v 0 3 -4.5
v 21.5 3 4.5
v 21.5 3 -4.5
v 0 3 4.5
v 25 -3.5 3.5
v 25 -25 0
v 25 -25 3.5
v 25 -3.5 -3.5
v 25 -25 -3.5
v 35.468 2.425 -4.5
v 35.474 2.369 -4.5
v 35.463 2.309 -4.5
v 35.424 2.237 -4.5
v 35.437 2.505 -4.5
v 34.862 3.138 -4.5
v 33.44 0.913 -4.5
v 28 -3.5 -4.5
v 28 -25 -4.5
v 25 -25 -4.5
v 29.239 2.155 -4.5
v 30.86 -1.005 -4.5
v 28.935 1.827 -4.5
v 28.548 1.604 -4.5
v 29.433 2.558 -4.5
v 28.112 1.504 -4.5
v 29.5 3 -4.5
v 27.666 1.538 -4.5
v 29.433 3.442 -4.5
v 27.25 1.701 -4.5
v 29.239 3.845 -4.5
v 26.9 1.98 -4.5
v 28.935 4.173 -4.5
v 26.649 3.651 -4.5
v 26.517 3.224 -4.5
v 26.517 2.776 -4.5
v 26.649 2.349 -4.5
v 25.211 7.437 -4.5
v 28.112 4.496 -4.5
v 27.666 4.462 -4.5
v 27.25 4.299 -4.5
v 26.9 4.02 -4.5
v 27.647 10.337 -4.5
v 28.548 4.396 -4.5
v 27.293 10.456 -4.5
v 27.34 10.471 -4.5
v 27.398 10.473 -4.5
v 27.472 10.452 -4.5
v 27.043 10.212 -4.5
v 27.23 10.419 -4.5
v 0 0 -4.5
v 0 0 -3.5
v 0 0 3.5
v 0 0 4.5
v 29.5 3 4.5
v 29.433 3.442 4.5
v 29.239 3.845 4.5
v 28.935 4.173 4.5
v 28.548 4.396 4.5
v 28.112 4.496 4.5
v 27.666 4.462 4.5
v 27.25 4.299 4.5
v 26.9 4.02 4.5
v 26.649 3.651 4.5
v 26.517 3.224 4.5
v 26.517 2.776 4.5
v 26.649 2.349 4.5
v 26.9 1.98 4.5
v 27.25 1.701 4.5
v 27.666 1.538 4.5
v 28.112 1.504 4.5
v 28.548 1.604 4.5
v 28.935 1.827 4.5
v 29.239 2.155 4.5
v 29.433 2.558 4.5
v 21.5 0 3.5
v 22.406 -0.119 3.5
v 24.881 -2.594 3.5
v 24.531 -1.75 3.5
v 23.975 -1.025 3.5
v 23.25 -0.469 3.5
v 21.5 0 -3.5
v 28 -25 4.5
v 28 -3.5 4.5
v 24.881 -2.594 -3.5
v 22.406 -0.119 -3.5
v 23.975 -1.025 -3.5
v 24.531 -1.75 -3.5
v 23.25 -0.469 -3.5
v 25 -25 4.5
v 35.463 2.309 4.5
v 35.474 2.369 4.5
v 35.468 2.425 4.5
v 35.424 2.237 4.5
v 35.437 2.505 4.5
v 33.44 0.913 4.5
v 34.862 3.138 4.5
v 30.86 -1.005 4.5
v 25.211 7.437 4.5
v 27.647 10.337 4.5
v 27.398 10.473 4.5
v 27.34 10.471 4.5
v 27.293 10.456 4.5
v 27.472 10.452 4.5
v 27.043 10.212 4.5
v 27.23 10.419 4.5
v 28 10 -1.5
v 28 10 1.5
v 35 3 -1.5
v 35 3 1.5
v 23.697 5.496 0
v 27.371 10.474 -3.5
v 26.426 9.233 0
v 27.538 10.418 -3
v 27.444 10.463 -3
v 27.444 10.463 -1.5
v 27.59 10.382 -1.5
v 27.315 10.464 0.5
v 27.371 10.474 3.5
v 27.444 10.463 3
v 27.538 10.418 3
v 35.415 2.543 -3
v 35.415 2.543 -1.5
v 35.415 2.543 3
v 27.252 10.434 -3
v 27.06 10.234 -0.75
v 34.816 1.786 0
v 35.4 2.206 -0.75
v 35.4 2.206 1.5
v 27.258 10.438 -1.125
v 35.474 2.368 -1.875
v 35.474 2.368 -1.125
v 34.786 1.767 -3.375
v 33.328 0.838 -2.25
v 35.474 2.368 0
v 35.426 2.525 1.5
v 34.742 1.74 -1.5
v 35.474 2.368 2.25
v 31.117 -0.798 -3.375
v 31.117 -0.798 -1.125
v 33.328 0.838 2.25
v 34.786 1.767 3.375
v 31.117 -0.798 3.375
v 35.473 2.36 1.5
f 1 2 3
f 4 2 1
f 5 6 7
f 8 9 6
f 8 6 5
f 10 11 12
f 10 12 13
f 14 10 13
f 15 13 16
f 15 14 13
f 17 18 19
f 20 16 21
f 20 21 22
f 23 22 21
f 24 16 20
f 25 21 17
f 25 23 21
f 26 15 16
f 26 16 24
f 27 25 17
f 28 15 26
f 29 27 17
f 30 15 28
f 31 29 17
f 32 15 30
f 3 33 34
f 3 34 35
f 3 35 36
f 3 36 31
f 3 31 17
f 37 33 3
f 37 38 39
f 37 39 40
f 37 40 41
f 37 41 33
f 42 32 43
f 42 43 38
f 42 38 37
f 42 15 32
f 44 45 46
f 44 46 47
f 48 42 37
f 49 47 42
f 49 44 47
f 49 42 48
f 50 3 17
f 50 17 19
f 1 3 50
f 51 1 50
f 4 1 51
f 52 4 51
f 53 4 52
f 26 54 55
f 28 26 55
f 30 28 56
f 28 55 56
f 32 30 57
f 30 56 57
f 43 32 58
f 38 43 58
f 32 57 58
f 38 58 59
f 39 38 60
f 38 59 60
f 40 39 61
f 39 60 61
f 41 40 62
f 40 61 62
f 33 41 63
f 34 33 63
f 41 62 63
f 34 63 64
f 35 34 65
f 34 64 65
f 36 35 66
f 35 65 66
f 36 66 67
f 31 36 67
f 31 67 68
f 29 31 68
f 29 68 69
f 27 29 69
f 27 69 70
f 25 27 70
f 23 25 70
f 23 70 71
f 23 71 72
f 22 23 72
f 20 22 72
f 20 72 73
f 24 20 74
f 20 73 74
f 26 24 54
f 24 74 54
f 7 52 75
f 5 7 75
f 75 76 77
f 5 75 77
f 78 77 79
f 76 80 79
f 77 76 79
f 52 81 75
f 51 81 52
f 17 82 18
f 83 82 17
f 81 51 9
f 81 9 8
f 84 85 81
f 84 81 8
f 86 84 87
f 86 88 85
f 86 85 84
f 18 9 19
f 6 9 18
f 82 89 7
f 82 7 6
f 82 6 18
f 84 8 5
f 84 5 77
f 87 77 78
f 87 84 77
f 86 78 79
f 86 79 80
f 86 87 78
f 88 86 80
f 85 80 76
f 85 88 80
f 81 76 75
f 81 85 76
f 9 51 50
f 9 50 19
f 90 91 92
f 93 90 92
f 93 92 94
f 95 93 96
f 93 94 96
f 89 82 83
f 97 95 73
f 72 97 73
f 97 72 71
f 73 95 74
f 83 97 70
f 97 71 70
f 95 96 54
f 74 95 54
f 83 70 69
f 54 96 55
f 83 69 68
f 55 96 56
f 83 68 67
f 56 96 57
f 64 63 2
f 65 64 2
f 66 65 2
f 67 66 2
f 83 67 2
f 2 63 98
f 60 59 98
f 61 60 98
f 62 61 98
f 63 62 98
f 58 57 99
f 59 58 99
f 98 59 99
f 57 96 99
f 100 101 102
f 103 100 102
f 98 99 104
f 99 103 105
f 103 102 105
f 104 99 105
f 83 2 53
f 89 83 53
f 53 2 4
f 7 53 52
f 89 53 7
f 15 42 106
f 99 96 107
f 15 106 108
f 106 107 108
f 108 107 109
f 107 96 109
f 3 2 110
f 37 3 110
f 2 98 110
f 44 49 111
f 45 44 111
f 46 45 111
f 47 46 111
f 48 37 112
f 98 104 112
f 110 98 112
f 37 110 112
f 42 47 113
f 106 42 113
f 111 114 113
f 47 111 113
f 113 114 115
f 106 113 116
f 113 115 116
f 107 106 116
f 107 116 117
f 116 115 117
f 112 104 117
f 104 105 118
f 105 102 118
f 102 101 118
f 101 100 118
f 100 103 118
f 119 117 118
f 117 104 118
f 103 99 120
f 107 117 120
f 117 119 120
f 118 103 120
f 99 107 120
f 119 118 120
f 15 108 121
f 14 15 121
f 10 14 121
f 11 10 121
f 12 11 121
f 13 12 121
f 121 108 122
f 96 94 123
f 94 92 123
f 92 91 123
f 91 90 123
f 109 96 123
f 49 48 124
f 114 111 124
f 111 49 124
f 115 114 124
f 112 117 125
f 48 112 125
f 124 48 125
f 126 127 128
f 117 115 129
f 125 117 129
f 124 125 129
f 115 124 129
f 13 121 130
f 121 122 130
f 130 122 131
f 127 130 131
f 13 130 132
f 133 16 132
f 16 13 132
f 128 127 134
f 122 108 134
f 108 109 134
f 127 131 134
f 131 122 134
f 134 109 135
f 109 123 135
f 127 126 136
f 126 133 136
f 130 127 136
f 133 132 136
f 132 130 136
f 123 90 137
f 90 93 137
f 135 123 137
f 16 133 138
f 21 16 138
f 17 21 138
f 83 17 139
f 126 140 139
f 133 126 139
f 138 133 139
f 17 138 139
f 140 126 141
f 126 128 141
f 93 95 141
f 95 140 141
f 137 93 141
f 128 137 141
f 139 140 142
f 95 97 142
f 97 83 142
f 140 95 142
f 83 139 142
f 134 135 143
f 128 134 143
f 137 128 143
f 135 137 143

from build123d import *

# Parameters (mm, degrees)
F2_DEPTH      = 4.5
F2_DEPTH_BACK = 4.5
F3_DEPTH      = 3.5
F3_DEPTH_BACK = 3.5
F4_R          = 1.5
F5_DEPTH      = 9


with BuildPart() as f2:
    # F1 (on face) → F2 (new body, two sides)
    with BuildSketch(Plane.XY) as f2_sk:
        with BuildLine():
            Line((28.0000000261, -25), (28.0000000261, -3.5))
            ThreePointArc((28.0000000261, -3.5), (26.0961940962, 1.0961940962), (21.5, 3.0000000261))
            Line((21.5, 3.0000000261), (0, 3.0000000261))
            Line((0, 3.0000000261), (0, 0))
            Line((0, 0), (25.0000000261, -25))
            Line((25.0000000261, -25), (28.0000000261, -25))
        make_face()
    extrude(amount=F2_DEPTH)
    extrude(f2_sk.sketch, amount=-F2_DEPTH_BACK)

    # F0 (on Top) → F3 (cut, two sides)
    with BuildSketch(Plane.XY) as f3_sk:
        with BuildLine():
            Line((21.5, 0), (0, 0))
            Line((0, 0), (25, -25))
            Line((25, -25), (25, -3.5))
            ThreePointArc((25, -3.5), (23.9748737342, -1.0251262658), (21.5, 0))
        make_face()
    extrude(amount=-F3_DEPTH, mode=Mode.SUBTRACT)
    extrude(f3_sk.sketch, amount=F3_DEPTH_BACK, mode=Mode.SUBTRACT)

    # F4 (on face) → F5 (join, through all)
    with BuildSketch(Plane.XY.offset(4.5)):
        with BuildLine():
            add(Edge.make_bspline(
                [(21.5, 3.0000000261), (28.0000000261, 10), (25.244596364, 12.7554036621), (37.7554036621, 0.244596364), (35, 3.0000000261), (28.0000000261, -3.5)],
                knots=[0, 0, 0, 0, 0.3313451275, 0.6686548725, 1, 1, 1, 1], degree=3))
            ThreePointArc((21.5, 3.0000000261), (26.0961940962, 1.0961940962), (28.0000000261, -3.5))
        make_face()
        with Locations((28.0000000261, 3.0000000261)):
            Circle(F4_R, mode=Mode.SUBTRACT)
    extrude(amount=-F5_DEPTH)


solid = f2.part
